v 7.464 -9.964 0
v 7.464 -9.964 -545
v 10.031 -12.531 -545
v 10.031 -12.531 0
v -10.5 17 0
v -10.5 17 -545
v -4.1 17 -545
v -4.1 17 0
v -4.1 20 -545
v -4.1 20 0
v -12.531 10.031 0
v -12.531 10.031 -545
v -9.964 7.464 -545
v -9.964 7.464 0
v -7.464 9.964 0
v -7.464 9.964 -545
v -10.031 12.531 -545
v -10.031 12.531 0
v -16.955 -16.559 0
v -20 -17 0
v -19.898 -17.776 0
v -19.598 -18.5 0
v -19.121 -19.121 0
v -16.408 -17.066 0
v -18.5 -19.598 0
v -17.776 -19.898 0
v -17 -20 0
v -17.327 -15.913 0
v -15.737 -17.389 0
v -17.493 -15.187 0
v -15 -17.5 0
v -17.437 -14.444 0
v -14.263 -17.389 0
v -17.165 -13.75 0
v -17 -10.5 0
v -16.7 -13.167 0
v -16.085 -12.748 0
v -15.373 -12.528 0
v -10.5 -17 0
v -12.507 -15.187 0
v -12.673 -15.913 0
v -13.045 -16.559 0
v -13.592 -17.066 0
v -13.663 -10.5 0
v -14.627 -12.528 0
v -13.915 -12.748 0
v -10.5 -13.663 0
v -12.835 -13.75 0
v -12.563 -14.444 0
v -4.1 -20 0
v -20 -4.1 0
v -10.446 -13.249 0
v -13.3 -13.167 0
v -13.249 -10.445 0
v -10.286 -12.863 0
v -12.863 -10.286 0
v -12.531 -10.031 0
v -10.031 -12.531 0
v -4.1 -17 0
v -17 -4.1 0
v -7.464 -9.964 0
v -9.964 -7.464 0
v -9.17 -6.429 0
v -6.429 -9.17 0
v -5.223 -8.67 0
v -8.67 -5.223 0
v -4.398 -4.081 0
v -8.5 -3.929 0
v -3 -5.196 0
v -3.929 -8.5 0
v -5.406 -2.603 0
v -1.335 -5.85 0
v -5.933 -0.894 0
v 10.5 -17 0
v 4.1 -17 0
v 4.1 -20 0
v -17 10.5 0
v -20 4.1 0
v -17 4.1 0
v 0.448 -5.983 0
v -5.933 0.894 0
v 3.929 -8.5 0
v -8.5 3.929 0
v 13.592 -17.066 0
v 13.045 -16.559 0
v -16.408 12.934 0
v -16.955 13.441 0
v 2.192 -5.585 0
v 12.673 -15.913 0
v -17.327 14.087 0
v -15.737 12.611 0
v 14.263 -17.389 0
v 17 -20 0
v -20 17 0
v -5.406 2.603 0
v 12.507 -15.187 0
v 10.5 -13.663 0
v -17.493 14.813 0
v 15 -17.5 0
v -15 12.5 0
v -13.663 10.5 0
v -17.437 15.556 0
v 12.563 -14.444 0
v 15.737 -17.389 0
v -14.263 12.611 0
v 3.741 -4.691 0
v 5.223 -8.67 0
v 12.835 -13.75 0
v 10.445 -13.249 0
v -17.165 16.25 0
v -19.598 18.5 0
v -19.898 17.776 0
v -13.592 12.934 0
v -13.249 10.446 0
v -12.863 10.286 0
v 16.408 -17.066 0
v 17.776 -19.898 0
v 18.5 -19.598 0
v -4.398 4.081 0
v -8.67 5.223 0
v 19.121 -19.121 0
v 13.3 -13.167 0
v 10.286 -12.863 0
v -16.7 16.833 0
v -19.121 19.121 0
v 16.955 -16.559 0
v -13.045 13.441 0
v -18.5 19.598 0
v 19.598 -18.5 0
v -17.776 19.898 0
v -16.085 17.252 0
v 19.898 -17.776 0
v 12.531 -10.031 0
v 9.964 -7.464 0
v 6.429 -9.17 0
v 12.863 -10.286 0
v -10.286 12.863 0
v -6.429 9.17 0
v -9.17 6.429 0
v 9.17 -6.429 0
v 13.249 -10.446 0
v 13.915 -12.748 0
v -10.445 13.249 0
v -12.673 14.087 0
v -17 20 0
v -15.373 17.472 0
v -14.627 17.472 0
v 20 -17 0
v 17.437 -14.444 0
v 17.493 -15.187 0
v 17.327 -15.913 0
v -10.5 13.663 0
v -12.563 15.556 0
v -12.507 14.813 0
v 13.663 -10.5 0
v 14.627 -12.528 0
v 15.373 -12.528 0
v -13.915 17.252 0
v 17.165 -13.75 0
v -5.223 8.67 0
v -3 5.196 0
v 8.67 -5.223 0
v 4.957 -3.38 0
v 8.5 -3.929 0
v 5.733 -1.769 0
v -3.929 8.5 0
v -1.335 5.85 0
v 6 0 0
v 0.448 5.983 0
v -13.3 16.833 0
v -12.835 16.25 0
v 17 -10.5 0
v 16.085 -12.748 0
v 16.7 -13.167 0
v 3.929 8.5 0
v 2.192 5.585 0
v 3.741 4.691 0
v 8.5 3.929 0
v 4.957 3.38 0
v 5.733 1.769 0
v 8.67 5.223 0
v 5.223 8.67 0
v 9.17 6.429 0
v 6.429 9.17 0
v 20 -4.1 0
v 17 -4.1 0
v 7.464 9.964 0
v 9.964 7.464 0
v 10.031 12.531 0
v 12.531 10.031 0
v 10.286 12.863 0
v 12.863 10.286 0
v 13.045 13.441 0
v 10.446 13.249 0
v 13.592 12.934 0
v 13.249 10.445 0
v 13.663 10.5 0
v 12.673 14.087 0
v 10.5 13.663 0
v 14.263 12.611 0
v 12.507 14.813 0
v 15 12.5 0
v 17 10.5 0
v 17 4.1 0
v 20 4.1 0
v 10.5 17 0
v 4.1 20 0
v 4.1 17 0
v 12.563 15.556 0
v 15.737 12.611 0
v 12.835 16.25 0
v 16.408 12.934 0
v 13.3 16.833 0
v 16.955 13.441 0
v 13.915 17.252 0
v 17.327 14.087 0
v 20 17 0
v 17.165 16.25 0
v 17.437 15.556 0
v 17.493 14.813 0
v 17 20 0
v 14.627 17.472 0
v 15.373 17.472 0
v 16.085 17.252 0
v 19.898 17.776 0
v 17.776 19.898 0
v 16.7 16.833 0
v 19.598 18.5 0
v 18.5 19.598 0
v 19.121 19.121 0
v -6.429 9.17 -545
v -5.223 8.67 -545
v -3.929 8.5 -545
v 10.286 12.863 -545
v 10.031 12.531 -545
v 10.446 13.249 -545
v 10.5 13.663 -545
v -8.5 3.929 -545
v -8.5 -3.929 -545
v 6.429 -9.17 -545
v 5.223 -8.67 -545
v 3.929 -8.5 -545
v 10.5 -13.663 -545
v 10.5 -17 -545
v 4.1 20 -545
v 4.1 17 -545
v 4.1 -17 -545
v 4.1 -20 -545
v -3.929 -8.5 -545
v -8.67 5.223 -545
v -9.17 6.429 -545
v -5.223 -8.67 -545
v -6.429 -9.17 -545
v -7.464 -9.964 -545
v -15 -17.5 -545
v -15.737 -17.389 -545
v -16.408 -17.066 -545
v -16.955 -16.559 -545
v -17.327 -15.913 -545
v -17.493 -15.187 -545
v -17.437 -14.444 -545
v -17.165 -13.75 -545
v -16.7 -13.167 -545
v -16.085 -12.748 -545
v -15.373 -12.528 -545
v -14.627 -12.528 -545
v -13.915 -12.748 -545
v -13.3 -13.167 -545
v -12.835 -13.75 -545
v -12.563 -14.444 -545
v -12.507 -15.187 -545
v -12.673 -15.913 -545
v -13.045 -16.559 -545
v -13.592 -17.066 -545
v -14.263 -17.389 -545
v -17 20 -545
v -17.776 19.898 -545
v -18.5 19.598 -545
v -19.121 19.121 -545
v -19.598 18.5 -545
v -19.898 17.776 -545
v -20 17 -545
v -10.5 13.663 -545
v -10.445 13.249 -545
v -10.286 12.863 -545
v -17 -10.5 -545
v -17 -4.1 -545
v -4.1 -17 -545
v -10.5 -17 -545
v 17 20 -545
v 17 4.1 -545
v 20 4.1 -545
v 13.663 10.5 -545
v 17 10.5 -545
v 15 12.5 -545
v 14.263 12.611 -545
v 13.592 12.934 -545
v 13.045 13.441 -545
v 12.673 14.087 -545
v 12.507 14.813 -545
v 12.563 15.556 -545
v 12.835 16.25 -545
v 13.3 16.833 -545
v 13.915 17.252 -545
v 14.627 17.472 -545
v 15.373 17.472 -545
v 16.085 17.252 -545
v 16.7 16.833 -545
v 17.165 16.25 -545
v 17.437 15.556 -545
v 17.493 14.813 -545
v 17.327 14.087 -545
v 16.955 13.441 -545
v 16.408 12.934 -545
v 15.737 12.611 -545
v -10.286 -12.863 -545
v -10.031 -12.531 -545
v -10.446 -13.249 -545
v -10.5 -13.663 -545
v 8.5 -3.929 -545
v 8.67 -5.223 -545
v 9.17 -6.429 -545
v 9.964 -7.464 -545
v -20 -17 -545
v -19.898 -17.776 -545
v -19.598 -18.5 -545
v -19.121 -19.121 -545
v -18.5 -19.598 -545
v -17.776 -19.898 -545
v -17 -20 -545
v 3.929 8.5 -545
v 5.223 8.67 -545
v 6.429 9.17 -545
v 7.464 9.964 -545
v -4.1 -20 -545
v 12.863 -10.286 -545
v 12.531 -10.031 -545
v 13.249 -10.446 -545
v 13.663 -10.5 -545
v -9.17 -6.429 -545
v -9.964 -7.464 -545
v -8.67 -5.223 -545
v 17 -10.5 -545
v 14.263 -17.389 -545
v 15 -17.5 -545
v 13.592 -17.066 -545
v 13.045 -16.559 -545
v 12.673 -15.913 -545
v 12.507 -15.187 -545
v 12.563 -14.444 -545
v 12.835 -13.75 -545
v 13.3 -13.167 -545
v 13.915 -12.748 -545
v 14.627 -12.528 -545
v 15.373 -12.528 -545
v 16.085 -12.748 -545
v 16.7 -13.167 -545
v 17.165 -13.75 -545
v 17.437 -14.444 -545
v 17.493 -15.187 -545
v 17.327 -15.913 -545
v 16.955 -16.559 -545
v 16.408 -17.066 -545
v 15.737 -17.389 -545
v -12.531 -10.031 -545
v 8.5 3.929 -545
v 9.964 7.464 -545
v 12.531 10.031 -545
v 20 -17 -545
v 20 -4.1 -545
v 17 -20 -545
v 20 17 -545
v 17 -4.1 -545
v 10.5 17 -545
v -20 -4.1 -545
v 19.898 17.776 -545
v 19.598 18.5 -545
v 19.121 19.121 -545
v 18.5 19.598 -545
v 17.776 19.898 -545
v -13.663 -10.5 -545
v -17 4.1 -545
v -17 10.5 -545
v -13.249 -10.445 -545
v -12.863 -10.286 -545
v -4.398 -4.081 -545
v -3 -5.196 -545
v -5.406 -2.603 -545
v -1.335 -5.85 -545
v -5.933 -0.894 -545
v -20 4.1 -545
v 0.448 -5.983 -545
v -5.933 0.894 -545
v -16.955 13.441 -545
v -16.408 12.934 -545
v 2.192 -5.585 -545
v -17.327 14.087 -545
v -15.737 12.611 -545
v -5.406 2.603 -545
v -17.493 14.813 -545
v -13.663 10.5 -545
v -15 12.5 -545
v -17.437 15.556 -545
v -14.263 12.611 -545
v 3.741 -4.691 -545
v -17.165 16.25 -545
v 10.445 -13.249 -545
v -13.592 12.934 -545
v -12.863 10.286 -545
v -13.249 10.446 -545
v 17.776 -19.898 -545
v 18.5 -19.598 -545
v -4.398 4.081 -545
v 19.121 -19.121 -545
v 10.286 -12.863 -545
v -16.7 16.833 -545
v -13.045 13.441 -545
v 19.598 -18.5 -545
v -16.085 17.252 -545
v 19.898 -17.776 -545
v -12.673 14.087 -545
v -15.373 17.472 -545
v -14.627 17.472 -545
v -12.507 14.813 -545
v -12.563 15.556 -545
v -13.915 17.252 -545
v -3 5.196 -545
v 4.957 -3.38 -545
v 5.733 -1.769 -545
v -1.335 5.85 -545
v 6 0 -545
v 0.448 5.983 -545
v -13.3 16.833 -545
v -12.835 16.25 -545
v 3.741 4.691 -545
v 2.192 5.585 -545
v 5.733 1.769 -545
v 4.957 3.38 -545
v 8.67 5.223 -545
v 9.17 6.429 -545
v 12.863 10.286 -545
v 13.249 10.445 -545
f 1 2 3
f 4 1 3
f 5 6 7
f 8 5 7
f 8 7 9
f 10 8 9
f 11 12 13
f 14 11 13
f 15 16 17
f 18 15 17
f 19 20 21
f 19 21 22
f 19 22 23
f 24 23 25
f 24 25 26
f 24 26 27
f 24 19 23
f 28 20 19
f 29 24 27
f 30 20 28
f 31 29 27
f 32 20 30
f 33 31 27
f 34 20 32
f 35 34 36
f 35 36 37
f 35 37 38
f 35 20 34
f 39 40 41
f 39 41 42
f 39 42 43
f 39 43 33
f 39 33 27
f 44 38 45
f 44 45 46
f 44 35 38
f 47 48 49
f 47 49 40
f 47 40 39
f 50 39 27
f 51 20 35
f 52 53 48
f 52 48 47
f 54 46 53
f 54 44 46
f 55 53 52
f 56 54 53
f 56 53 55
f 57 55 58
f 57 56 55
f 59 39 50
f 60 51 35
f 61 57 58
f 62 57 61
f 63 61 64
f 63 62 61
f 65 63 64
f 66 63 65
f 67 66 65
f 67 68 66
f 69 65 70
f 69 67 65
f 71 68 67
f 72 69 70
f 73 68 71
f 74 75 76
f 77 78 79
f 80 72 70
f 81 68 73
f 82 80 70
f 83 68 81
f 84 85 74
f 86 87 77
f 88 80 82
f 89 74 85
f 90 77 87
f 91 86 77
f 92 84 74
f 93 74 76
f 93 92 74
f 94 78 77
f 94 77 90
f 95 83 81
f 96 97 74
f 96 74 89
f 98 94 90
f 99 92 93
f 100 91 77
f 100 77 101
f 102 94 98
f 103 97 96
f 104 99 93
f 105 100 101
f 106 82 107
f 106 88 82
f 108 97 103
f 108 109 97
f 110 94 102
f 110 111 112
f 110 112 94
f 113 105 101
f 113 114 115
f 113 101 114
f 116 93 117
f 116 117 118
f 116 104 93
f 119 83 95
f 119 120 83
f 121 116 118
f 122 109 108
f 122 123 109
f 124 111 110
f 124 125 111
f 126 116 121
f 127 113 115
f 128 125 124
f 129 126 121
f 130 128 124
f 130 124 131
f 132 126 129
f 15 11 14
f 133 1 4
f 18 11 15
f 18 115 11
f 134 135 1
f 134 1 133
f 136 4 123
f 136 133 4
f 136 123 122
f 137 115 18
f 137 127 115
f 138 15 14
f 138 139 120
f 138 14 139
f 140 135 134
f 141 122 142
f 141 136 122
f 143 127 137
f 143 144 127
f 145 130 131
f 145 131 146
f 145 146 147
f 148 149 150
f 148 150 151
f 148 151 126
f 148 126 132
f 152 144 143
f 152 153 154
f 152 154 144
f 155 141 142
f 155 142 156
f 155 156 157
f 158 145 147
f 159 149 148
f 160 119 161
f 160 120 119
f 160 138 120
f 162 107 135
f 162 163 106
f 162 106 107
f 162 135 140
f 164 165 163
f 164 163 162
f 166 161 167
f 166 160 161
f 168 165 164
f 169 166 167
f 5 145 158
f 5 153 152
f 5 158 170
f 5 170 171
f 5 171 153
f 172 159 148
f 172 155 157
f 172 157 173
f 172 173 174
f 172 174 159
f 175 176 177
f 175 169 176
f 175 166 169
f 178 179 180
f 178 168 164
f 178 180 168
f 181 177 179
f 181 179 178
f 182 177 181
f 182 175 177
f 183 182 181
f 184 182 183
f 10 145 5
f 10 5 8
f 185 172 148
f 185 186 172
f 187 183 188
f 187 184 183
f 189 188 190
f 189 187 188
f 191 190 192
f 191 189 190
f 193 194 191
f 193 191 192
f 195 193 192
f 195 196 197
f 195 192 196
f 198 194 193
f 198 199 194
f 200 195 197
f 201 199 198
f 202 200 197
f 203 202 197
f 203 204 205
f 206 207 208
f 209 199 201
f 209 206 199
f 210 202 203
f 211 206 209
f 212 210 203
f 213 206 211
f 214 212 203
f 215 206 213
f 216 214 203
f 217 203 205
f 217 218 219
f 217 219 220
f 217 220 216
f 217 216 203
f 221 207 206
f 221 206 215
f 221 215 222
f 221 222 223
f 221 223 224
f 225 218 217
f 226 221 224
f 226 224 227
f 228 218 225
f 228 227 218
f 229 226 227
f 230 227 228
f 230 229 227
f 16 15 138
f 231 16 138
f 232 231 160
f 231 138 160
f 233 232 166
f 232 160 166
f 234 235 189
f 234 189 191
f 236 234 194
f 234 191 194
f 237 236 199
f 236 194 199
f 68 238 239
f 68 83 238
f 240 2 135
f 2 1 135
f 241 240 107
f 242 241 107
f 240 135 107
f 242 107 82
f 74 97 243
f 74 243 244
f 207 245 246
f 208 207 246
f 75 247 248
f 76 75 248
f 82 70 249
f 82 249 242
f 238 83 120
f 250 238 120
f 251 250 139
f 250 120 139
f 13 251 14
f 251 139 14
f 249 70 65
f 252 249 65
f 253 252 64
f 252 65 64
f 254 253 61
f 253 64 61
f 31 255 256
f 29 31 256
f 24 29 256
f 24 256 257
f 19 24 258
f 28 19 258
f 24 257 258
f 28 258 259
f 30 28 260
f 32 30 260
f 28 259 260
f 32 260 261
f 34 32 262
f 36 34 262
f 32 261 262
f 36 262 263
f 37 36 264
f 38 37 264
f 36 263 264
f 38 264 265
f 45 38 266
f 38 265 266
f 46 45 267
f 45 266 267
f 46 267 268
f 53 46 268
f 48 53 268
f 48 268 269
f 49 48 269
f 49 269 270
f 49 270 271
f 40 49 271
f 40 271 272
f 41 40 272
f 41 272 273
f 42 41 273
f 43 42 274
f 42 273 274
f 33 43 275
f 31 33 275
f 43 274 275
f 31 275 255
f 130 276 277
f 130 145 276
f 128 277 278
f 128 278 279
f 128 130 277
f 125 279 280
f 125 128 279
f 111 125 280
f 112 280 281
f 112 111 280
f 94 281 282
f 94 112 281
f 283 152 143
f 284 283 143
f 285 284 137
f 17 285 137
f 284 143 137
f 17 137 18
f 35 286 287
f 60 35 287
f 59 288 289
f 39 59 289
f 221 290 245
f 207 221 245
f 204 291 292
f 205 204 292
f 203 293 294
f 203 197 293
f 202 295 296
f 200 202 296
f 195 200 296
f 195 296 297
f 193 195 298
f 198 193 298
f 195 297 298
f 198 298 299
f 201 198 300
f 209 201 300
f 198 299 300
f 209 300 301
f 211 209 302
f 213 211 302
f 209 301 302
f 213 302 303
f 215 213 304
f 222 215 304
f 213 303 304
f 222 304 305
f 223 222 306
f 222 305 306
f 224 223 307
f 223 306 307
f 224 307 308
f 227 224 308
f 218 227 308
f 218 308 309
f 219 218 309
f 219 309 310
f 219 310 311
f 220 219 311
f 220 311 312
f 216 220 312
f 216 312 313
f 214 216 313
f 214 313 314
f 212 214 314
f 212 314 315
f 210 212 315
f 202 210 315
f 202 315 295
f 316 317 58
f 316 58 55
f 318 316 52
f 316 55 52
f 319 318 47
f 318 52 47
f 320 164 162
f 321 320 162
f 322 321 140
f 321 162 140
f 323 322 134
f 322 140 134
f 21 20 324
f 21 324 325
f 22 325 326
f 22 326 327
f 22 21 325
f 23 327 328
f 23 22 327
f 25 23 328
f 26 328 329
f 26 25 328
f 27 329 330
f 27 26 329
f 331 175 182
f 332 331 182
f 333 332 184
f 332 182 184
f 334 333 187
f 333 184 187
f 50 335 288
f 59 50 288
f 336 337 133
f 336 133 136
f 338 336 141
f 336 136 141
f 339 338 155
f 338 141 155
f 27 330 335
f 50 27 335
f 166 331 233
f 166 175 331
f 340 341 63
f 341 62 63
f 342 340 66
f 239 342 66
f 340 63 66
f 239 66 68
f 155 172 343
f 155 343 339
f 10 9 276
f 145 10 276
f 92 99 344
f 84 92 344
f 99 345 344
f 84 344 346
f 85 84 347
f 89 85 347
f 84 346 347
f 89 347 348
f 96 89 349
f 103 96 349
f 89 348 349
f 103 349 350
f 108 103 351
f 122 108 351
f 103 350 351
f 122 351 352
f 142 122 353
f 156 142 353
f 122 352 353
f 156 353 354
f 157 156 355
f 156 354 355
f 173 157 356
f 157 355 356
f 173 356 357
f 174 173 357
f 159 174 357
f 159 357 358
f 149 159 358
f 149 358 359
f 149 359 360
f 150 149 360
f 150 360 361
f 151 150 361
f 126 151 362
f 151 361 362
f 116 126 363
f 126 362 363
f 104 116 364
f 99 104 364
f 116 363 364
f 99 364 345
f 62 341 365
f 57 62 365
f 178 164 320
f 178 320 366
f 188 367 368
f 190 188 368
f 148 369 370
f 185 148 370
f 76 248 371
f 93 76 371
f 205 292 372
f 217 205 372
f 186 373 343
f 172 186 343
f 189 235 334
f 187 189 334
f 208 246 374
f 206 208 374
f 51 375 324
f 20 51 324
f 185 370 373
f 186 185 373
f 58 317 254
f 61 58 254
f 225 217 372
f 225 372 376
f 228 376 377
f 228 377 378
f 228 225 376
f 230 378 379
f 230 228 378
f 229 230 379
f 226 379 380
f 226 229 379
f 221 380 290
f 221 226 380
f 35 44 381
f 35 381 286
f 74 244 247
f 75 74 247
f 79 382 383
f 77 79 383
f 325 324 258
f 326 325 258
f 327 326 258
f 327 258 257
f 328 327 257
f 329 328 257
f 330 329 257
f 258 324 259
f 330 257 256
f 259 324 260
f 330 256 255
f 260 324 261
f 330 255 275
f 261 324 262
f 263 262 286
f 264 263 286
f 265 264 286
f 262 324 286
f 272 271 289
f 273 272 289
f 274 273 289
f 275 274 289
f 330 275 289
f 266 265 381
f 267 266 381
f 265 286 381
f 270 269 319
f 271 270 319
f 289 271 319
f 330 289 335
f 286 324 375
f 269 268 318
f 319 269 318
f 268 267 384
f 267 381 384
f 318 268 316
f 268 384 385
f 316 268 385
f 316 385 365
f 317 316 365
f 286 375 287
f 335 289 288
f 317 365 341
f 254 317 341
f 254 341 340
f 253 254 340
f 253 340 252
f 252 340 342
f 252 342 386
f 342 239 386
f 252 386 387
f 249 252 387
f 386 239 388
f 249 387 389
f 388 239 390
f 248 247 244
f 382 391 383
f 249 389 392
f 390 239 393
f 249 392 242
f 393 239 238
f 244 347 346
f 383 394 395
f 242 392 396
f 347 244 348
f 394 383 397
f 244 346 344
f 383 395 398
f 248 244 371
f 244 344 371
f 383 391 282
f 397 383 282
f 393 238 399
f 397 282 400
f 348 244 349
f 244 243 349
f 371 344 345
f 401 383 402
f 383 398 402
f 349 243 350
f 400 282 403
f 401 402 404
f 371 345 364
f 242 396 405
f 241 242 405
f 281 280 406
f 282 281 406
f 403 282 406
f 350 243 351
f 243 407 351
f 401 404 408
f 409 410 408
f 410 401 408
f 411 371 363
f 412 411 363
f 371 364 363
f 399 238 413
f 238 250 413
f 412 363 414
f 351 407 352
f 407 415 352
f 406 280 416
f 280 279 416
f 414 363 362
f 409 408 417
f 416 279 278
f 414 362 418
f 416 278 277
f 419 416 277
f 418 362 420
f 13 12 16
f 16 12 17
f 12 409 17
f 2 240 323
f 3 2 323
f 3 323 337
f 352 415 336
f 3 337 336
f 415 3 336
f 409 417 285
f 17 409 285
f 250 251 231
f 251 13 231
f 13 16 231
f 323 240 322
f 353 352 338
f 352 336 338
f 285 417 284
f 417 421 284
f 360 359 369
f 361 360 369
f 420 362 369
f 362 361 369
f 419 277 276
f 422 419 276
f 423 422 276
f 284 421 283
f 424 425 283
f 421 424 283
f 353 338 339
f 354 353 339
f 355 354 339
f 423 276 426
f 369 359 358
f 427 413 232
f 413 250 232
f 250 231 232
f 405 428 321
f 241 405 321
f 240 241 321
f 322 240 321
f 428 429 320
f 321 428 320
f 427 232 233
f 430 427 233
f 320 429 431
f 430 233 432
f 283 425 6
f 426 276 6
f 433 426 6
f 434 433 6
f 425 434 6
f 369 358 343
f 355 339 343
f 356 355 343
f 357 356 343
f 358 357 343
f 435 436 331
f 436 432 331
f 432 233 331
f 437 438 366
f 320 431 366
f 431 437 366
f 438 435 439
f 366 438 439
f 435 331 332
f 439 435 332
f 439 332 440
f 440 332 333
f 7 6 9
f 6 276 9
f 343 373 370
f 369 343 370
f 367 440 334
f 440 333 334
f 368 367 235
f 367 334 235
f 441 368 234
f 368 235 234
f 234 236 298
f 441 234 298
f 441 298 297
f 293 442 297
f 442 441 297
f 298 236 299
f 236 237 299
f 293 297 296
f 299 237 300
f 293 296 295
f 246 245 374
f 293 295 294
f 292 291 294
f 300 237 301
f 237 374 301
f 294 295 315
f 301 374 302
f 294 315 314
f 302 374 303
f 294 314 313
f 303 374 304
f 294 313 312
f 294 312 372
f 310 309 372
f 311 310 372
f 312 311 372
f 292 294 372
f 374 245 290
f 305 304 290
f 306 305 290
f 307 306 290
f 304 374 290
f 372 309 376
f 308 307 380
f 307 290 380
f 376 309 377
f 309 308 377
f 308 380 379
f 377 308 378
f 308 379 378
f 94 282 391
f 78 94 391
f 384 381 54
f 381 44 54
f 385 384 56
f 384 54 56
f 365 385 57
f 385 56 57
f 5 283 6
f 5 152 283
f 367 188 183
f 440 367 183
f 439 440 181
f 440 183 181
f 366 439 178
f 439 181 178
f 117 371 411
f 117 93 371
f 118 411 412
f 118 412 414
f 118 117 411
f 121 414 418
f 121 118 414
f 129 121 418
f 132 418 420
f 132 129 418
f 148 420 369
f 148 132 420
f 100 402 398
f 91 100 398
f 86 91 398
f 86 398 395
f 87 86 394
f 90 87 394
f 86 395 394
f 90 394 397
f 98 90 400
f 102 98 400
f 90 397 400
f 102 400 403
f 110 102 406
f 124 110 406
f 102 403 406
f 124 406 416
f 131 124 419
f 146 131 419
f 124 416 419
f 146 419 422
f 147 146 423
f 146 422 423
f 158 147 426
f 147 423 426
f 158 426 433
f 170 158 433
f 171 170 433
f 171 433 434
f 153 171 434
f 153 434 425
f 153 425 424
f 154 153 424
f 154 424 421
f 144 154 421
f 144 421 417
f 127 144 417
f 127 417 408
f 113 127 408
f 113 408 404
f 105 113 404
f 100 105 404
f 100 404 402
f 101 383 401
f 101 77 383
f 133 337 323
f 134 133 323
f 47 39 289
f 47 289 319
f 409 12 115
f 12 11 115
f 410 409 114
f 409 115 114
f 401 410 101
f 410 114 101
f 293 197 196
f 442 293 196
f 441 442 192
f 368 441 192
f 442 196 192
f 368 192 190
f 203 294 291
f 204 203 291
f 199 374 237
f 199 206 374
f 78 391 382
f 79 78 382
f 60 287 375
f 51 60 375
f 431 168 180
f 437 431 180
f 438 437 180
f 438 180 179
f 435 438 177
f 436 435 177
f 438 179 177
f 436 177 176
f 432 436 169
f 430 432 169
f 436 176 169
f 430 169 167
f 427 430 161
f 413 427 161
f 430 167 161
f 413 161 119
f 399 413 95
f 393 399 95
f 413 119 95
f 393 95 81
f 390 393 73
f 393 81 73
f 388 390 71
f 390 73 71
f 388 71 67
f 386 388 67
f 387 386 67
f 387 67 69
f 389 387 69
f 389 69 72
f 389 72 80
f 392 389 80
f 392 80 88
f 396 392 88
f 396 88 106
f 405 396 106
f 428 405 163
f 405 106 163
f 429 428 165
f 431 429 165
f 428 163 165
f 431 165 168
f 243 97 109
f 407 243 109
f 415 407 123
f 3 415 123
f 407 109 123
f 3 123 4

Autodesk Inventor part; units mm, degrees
sketch "Skizze_1" plane through (0, 0, 0) normal (0, 0, 1) x (1, 0, 0)
  arc A0 (-20, -17) -> (-17, -20) centre (-17, -17) ccw
  line L0 (-17, -20) -> (-4.1, -20)
  line L1 (-4.1, -20) -> (-4.1, -17)
  line L2 (-4.1, -17) -> (-10.5, -17)
  line L3 (-10.5, -17) -> (-10.5, -13.6627)
  arc A1 (-10.0314, -12.5314) -> (-10.5, -13.6627) centre (-8.9002, -13.6627) ccw
  line L4 (-10.0314, -12.5314) -> (-7.4645, -9.9645)
  arc A2 (-3.9289, -8.5) -> (-7.4645, -9.9645) centre (-3.9289, -13.5) ccw
  line L5 (-3.9289, -8.5) -> (3.9289, -8.5)
  arc A3 (7.4645, -9.9645) -> (3.9289, -8.5) centre (3.9289, -13.5) ccw
  line L6 (7.4645, -9.9645) -> (10.0314, -12.5314)
  arc A4 (10.5, -13.6627) -> (10.0314, -12.5314) centre (8.9002, -13.6627) ccw
  line L7 (10.5, -13.6627) -> (10.5, -17)
  line L8 (10.5, -17) -> (4.1, -17)
  line L9 (4.1, -17) -> (4.1, -20)
  line L10 (4.1, -20) -> (17, -20)
  arc A5 (17, -20) -> (20, -17) centre (17, -17) ccw
  line L11 (20, -17) -> (20, -4.1)
  line L12 (20, -4.1) -> (17, -4.1)
  line L13 (17, -4.1) -> (17, -10.5)
  line L14 (17, -10.5) -> (13.6627, -10.5)
  arc A6 (12.5314, -10.0314) -> (13.6627, -10.5) centre (13.6627, -8.9002) ccw
  line L15 (12.5314, -10.0314) -> (9.9645, -7.4645)
  arc A7 (8.5, -3.9289) -> (9.9645, -7.4645) centre (13.5, -3.9289) ccw
  line L16 (8.5, -3.9289) -> (8.5, 3.9289)
  arc A8 (9.9645, 7.4645) -> (8.5, 3.9289) centre (13.5, 3.9289) ccw
  line L17 (9.9645, 7.4645) -> (12.5314, 10.0314)
  arc A9 (13.6627, 10.5) -> (12.5314, 10.0314) centre (13.6627, 8.9002) ccw
  line L18 (13.6627, 10.5) -> (17, 10.5)
  line L19 (17, 10.5) -> (17, 4.1)
  line L20 (17, 4.1) -> (20, 4.1)
  line L21 (20, 4.1) -> (20, 17)
  arc A10 (20, 17) -> (17, 20) centre (17, 17) ccw
  line L22 (17, 20) -> (4.1, 20)
  line L23 (4.1, 20) -> (4.1, 17)
  line L24 (4.1, 17) -> (10.5, 17)
  line L25 (10.5, 17) -> (10.5, 13.6627)
  arc A11 (10.0314, 12.5314) -> (10.5, 13.6627) centre (8.9002, 13.6627) ccw
  line L26 (10.0314, 12.5314) -> (7.4645, 9.9645)
  arc A12 (3.9289, 8.5) -> (7.4645, 9.9645) centre (3.9289, 13.5) ccw
  line L27 (3.9289, 8.5) -> (-3.9289, 8.5)
  arc A13 (-7.4645, 9.9645) -> (-3.9289, 8.5) centre (-3.9289, 13.5) ccw
  line L28 (-7.4645, 9.9645) -> (-10.0314, 12.5314)
  arc A14 (-10.5, 13.6627) -> (-10.0314, 12.5314) centre (-8.9002, 13.6627) ccw
  line L29 (-10.5, 13.6627) -> (-10.5, 17)
  line L30 (-10.5, 17) -> (-4.1, 17)
  line L31 (-4.1, 17) -> (-4.1, 20)
  line L32 (-4.1, 20) -> (-17, 20)
  arc A15 (-17, 20) -> (-20, 17) centre (-17, 17) ccw
  line L33 (-20, 17) -> (-20, 4.1)
  line L34 (-20, 4.1) -> (-17, 4.1)
  line L35 (-17, 4.1) -> (-17, 10.5)
  line L36 (-17, 10.5) -> (-13.6627, 10.5)
  arc A16 (-12.5314, 10.0314) -> (-13.6627, 10.5) centre (-13.6627, 8.9002) ccw
  line L37 (-12.5314, 10.0314) -> (-9.9645, 7.4645)
  arc A17 (-8.5, 3.9289) -> (-9.9645, 7.4645) centre (-13.5, 3.9289) ccw
  line L38 (-8.5, 3.9289) -> (-8.5, -3.9289)
  arc A18 (-9.9645, -7.4645) -> (-8.5, -3.9289) centre (-13.5, -3.9289) ccw
  line L39 (-9.9645, -7.4645) -> (-12.5314, -10.0314)
  arc A19 (-13.6627, -10.5) -> (-12.5314, -10.0314) centre (-13.6627, -8.9002) ccw
  line L40 (-13.6627, -10.5) -> (-17, -10.5)
  line L41 (-17, -10.5) -> (-17, -4.1)
  line L42 (-17, -4.1) -> (-20, -4.1)
  line L43 (-20, -4.1) -> (-20, -17)
  circle A20 centre (0, 0) radius 6
extrude "Extrusion1" add sketch "Skizze_1" against normal blind 545
sketch "Sketch2" plane through (0, 0, 0) normal (0, 0, 1) x (1, 0, 0)
  point P0 (-15, -15)
hole "Drilling 1" at (-15, -15, 0) direction (0, 0, -1) diameter 5 depth 6000
sketch "Sketch3" plane through (0, 0, 0) normal (0, 0, 1) x (1, 0, 0)
  point P0 (15, -15)
hole "Drilling 2" at (15, -15, 0) direction (0, 0, -1) diameter 5 depth 6000
sketch "Sketch4" plane through (0, 0, 0) normal (0, 0, 1) x (1, 0, 0)
  point P0 (15, 15)
hole "Drilling 3" at (15, 15, 0) direction (0, 0, -1) diameter 5 depth 6000
sketch "Sketch5" plane through (0, 0, 0) normal (0, 0, 1) x (1, 0, 0)
  point P0 (-15, 15)
hole "Drilling 4" at (-15, 15, 0) direction (0, 0, -1) diameter 5 depth 6000
ref_plane "side_4d_XY" through (-20, 0, -272.5) normal (-1, 0, 0) x (0, 1, 0)
ref_plane "side_4d_YZ" through (-20, 0, -272.5) normal (0, 1, 0) x (0, 0, -1)
ref_plane "side_4d_ZX" through (-20, 0, -272.5) normal (0, 0, -1) x (-1, 0, 0)
ref_plane "side_1a_XY" through (0, 20, -272.5) normal (0, 1, 0) x (1, 0, 0)
ref_plane "side_1a_YZ" through (0, 20, -272.5) normal (1, 0, 0) x (0, 0, -1)
ref_plane "side_1a_ZX" through (0, 20, -272.5) normal (0, 0, -1) x (0, 1, 0)
ref_plane "side_2b_XY" through (20, 0, -272.5) normal (1, 0, 0) x (0, -1, 0)
ref_plane "side_2b_YZ" through (20, 0, -272.5) normal (0, -1, 0) x (0, 0, -1)
ref_plane "side_2b_ZX" through (20, 0, -272.5) normal (0, 0, -1) x (1, 0, 0)
ref_plane "side_3c_XY" through (0, -20, -272.5) normal (0, -1, 0) x (-1, 0, 0)
ref_plane "side_3c_YZ" through (0, -20, -272.5) normal (-1, 0, 0) x (0, 0, -1)
ref_plane "side_3c_ZX" through (0, -20, -272.5) normal (0, 0, -1) x (0, -1, 0)
ref_plane "end_XY" through (0, 0, -545) normal (0, 0, -1) x (1, 0, 0)
ref_plane "end_YZ" through (0, 0, -545) normal (1, 0, 0) x (0, -1, 0)
ref_plane "end_ZX" through (0, 0, -545) normal (0, -1, 0) x (0, 0, -1)
ref_plane "start_XY" through (0, 0, 0) normal (0, 0, 1) x (1, 0, 0)
ref_plane "start_YZ" through (0, 0, 0) normal (1, 0, 0) x (0, 1, 0)
ref_plane "start_ZX" through (0, 0, 0) normal (0, 1, 0) x (0, 0, 1)
properties part number "MayTec 1.11.040040.43S_Profile 40x40, 4E, S_545_Detail_(0;0,0,0)"
